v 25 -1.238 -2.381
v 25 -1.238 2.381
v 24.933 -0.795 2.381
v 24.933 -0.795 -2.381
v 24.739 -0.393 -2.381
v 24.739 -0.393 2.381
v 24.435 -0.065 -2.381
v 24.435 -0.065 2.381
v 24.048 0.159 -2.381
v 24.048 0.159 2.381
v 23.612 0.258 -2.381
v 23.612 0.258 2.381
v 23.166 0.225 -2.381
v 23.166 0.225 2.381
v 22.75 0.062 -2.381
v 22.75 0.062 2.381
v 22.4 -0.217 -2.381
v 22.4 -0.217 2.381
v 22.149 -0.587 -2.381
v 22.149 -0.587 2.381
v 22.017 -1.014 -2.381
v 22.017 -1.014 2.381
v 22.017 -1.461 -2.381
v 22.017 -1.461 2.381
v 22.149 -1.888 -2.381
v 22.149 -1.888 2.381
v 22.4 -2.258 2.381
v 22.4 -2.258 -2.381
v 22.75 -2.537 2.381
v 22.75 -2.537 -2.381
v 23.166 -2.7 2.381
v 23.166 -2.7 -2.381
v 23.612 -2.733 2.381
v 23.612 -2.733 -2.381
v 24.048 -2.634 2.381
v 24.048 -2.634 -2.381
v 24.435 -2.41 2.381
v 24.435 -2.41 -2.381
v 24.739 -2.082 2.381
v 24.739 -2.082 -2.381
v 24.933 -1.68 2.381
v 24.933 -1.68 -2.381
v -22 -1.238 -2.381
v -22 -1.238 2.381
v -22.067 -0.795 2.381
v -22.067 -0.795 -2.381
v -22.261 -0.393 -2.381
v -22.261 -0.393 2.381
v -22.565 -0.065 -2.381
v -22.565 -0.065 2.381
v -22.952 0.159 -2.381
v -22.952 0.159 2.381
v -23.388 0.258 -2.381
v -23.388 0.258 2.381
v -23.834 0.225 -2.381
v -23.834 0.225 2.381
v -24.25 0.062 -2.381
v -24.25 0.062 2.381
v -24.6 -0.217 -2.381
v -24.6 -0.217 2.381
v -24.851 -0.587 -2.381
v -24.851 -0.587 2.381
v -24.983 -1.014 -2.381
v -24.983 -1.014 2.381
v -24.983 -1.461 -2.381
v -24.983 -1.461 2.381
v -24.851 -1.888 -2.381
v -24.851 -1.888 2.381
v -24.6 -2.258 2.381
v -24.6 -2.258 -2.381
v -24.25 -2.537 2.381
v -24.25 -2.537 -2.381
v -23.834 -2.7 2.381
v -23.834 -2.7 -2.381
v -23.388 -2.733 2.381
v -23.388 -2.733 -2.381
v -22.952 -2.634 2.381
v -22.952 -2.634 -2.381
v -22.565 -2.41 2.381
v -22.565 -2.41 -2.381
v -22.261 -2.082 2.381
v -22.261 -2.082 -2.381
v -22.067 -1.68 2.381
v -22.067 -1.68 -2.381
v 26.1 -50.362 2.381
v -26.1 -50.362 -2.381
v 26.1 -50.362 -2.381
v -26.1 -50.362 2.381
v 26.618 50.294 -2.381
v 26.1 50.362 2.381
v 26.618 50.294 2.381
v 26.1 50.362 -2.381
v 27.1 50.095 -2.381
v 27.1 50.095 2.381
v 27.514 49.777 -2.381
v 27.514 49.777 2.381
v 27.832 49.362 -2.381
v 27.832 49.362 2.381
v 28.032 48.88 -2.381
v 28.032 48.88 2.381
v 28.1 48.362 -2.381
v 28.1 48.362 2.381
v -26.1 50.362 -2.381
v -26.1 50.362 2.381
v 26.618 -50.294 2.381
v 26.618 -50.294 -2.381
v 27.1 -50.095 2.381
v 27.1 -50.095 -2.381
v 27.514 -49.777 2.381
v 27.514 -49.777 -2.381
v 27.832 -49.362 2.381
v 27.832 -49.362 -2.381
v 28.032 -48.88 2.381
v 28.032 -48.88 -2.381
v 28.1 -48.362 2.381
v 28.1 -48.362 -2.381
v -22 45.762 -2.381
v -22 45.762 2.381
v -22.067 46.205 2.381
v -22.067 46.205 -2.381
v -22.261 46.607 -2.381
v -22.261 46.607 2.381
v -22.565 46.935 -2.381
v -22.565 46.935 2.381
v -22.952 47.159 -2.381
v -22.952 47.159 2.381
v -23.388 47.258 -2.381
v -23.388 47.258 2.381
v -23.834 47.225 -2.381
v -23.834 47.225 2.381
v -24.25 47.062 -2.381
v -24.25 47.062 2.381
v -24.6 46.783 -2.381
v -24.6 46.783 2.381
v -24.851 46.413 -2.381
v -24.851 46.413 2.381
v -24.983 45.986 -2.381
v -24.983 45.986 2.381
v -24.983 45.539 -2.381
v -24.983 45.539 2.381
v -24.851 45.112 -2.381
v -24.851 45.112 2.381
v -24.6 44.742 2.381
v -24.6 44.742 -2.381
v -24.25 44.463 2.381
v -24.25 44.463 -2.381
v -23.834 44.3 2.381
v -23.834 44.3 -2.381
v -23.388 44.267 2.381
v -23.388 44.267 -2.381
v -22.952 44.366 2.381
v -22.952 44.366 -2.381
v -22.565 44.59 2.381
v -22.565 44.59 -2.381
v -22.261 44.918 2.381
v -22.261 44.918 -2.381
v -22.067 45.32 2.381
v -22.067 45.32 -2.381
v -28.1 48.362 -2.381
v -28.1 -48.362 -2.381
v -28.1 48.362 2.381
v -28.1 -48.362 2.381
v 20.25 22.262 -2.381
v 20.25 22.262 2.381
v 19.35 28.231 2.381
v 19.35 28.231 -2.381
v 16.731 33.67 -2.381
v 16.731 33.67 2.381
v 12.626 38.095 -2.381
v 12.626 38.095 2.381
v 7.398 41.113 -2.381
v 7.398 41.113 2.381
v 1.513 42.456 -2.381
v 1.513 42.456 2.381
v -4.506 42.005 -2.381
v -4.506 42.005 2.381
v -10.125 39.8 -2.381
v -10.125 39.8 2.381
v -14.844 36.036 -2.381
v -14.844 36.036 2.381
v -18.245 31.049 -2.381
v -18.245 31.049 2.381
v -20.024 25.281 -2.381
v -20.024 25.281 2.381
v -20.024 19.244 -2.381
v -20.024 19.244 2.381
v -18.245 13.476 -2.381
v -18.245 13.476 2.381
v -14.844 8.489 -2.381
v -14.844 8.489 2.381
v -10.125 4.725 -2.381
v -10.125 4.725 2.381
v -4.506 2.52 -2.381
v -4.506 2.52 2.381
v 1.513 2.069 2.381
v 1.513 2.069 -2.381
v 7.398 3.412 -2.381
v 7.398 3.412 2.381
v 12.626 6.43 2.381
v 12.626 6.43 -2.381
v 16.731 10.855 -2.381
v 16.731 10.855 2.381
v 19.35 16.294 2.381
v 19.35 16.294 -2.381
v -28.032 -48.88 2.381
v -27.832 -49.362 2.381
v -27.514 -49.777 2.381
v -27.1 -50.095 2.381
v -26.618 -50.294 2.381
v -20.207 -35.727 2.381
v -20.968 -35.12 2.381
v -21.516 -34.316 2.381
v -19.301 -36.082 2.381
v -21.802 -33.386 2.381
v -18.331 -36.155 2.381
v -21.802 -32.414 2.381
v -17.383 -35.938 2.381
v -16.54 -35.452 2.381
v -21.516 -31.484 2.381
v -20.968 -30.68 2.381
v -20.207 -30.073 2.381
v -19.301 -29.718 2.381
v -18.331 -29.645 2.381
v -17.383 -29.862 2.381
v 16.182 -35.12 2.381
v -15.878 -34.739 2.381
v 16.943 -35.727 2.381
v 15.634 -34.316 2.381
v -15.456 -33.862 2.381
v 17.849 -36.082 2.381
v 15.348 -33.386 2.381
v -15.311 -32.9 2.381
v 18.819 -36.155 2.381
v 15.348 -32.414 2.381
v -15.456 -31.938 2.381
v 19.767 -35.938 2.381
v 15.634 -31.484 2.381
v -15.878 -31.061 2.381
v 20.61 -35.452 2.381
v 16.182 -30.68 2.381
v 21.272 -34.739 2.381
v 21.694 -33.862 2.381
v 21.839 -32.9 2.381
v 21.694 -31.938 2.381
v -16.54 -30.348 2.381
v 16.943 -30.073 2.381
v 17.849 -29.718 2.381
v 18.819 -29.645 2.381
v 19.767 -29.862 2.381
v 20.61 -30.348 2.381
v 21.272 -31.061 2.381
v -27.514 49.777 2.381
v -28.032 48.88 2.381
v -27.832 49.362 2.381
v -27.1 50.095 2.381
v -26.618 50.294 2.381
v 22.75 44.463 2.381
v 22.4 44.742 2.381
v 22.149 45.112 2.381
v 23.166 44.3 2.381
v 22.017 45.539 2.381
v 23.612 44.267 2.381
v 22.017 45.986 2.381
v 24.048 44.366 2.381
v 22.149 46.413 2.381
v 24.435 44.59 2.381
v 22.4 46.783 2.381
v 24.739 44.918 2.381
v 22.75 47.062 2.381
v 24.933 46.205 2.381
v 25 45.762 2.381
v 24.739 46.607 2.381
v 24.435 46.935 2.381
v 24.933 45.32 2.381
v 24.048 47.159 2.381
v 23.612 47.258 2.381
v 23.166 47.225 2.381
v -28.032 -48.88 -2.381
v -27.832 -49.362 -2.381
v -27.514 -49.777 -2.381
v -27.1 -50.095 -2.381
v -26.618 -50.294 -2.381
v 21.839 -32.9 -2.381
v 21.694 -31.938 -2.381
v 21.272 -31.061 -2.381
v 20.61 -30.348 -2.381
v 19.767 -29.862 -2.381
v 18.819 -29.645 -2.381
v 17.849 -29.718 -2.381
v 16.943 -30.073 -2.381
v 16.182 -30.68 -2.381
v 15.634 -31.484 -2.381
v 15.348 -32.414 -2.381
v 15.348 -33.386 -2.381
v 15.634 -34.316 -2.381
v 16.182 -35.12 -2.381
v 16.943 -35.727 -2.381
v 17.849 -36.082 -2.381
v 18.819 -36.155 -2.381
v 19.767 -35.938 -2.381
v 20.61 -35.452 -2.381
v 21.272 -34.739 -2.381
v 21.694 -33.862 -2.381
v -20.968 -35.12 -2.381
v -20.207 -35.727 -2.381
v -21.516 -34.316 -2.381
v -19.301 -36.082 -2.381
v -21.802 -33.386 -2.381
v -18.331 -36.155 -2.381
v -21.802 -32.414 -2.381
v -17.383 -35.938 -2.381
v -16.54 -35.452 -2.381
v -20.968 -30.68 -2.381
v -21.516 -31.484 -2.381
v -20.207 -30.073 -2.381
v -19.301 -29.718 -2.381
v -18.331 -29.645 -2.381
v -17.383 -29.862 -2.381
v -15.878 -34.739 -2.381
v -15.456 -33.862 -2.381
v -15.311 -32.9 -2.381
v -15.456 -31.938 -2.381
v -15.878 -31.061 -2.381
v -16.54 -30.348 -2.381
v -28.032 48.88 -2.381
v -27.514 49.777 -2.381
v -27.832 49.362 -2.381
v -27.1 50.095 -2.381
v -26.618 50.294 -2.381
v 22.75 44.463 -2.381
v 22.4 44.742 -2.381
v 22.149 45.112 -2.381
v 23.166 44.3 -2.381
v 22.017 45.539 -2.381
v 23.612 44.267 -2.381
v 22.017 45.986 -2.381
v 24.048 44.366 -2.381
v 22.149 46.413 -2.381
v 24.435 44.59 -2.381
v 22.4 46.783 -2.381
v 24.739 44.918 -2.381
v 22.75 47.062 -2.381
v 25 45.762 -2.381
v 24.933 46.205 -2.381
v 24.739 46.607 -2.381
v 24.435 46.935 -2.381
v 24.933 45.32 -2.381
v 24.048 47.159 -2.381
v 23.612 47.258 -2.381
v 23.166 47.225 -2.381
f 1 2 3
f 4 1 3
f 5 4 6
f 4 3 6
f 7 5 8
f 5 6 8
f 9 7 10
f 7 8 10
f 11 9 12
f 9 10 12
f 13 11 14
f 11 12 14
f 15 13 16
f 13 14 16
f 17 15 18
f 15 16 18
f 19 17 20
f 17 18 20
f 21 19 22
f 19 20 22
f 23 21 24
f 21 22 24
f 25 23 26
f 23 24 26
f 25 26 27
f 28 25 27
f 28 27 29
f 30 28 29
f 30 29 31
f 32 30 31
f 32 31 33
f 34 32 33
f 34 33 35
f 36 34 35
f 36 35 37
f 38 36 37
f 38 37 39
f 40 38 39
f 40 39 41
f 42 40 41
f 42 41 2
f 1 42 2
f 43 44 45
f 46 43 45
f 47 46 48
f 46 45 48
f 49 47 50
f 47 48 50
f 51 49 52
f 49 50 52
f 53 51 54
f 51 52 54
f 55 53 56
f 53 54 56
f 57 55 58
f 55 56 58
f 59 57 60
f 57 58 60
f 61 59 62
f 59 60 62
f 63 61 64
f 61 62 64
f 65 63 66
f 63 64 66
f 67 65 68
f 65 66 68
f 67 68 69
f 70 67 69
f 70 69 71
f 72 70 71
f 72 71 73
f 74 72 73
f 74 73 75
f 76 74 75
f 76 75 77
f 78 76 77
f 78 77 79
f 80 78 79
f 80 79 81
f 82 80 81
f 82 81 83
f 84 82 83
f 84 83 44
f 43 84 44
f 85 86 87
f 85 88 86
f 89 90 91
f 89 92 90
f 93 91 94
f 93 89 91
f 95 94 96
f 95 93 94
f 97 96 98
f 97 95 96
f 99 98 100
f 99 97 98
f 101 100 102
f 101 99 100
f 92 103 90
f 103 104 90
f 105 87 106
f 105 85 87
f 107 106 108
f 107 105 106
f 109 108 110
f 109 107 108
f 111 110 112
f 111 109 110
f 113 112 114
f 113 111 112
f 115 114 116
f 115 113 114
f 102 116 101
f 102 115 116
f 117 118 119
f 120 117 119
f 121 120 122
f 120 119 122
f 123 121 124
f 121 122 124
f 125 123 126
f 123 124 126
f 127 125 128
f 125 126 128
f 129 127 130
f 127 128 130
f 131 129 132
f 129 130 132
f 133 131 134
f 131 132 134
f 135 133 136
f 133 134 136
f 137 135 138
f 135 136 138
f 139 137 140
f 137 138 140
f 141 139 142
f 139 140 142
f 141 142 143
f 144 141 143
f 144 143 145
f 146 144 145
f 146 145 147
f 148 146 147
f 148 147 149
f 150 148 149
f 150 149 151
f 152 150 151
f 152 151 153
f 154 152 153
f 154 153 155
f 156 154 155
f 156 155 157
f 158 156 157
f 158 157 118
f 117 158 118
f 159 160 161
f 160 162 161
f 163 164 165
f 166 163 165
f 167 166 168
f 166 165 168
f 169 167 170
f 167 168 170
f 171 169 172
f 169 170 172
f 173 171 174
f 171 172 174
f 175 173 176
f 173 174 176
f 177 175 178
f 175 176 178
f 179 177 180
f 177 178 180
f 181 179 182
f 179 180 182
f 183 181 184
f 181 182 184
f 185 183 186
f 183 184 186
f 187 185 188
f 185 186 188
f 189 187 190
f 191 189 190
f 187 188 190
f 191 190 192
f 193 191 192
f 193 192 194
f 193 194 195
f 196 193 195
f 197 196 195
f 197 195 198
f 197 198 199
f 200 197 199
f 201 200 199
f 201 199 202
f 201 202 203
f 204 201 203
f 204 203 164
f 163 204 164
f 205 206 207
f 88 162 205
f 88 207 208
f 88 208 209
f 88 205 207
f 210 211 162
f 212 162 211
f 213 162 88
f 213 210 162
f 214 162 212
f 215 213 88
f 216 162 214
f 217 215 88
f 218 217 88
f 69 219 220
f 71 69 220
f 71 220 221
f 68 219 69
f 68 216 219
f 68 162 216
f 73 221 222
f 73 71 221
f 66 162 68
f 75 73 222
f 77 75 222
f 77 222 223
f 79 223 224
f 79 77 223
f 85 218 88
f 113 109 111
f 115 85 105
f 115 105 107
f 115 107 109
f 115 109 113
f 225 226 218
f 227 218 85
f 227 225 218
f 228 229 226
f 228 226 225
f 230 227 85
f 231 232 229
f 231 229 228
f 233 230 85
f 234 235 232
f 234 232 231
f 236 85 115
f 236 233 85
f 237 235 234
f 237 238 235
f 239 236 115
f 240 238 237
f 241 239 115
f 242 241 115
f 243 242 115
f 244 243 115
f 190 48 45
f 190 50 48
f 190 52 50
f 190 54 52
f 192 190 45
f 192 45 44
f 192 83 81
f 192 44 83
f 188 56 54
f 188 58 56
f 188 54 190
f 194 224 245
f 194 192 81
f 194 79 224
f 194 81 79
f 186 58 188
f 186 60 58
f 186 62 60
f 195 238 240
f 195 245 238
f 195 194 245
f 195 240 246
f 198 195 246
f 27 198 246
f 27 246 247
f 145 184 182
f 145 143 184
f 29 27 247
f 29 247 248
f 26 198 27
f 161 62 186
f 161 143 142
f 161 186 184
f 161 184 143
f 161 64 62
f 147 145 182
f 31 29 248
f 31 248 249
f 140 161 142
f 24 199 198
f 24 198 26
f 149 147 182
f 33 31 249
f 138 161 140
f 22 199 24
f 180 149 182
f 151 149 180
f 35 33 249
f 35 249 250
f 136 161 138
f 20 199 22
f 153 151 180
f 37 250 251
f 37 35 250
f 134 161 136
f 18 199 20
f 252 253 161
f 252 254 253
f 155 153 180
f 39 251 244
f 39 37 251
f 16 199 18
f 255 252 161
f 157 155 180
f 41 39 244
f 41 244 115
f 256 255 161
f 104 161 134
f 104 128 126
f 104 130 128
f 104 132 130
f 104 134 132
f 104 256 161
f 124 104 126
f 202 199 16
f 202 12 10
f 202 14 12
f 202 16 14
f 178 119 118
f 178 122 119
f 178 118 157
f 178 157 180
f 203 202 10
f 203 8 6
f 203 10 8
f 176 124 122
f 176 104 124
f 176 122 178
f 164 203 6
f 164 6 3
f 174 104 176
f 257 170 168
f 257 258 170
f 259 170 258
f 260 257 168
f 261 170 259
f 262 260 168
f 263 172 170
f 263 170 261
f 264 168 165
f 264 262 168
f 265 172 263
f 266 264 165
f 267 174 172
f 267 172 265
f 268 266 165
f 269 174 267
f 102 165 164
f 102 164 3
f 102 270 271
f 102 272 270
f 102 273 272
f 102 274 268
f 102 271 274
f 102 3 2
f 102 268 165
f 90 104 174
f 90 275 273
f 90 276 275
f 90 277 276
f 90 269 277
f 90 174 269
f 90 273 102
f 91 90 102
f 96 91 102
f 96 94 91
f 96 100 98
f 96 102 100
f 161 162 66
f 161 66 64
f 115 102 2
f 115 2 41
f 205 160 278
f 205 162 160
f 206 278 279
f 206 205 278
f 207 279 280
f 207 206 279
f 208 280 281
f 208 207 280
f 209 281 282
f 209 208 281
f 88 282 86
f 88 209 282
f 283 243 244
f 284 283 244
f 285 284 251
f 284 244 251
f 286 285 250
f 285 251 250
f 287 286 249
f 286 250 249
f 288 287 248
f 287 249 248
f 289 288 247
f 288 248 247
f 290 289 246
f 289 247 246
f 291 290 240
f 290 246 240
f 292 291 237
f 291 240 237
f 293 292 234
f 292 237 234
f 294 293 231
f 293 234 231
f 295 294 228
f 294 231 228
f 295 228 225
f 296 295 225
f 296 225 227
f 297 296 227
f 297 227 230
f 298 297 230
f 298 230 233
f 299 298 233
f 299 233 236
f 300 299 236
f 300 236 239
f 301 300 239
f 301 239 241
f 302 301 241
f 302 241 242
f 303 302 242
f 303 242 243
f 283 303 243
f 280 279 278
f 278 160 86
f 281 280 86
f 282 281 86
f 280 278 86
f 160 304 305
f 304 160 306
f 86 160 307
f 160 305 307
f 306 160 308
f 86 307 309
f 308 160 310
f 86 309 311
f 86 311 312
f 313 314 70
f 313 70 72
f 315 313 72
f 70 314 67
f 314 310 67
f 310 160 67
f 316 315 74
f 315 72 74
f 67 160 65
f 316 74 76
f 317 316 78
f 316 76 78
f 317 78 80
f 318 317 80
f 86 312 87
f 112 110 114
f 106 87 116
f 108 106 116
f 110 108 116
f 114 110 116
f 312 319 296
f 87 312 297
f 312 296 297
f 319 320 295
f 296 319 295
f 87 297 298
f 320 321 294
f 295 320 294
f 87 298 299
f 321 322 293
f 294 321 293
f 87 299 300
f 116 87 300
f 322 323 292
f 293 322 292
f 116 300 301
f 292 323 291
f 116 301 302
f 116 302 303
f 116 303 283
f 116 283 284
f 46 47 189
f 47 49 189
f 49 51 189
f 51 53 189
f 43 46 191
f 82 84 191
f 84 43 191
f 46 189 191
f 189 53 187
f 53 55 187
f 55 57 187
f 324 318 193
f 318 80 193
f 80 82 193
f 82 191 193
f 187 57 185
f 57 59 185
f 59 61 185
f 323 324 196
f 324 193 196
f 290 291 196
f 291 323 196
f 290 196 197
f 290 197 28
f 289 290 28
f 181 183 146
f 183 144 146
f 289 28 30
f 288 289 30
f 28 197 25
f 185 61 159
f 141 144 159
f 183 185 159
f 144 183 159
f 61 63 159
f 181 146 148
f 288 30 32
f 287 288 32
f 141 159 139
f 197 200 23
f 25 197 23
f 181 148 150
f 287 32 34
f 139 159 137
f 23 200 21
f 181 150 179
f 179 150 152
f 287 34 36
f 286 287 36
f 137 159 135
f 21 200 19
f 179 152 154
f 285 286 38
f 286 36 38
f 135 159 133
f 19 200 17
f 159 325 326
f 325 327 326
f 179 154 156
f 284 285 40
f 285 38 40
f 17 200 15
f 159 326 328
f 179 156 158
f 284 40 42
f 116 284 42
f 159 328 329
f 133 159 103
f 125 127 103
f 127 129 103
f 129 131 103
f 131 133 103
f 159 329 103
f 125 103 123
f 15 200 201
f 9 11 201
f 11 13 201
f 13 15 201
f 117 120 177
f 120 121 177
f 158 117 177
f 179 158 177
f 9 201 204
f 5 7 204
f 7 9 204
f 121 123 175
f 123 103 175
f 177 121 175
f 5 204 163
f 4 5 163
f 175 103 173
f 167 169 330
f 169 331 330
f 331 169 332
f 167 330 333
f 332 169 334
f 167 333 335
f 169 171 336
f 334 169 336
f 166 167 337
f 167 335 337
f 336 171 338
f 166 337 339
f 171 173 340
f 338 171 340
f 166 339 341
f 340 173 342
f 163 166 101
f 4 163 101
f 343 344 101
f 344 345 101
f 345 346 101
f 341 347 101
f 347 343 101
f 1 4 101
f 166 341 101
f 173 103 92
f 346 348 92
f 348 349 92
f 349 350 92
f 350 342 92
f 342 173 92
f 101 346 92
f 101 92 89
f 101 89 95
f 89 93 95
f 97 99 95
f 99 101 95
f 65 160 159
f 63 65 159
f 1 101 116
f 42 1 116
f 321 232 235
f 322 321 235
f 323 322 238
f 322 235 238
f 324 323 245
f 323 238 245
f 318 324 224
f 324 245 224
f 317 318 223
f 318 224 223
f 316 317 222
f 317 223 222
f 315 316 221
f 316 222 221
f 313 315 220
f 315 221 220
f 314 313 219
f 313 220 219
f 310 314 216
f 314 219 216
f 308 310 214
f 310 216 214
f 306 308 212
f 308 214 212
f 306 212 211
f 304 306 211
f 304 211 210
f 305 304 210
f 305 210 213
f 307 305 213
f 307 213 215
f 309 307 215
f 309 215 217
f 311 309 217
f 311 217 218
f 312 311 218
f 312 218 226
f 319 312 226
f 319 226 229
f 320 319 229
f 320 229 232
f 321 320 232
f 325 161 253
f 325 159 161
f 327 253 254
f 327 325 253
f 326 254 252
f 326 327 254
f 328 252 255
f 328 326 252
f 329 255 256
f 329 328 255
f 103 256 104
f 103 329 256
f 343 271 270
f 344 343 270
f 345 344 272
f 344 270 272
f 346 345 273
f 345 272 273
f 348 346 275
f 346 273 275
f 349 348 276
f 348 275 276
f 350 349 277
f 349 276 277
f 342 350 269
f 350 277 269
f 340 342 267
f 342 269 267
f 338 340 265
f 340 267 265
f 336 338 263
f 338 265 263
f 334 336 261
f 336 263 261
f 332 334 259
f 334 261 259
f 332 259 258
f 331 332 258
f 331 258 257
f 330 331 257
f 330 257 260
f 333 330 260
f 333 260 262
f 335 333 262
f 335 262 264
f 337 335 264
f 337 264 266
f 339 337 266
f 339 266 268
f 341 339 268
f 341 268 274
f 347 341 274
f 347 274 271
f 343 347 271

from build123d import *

# Parameters (mm, degrees)
SKETCH1_W           = 56.2
SKETCH1_H           = 100.725
BOSS_EXTRUDE1_DEPTH = 2.38125
SKETCH2_R           = 20.25
SKETCH2_R_2         = 1.5
SKETCH2_R_3         = 3.2639
CUT_EXTRUDE1_DEPTH  = 58.867718224
FILLET1_R           = 2


with BuildPart() as part:
    # Sketch1 → Boss-Extrude1 (new, symmetric)
    with BuildSketch(Plane.XY):
        Rectangle(SKETCH1_W, SKETCH1_H)
    extrude(amount=BOSS_EXTRUDE1_DEPTH, both=True)

    # Sketch2 → Cut-Extrude1 (cut, through all)
    with BuildSketch(Plane.XY.offset(2.38125)):
        with Locations((0, 22.2625)):
            Circle(SKETCH2_R)
        with Locations((-23.5, 45.7625)):
            Circle(SKETCH2_R_2)
        with Locations((23.5, 45.7625)):
            Circle(SKETCH2_R_2)
        with Locations((-23.5, -1.2375)):
            Circle(SKETCH2_R_2)
        with Locations((23.5, -1.2375)):
            Circle(SKETCH2_R_2)
        with Locations((-18.575, -32.9)):
            Circle(SKETCH2_R_3)
        with Locations((18.575, -32.9)):
            Circle(SKETCH2_R_3)
    extrude(amount=-CUT_EXTRUDE1_DEPTH, mode=Mode.SUBTRACT)

    # Fillet1
    fillet1_edges = [part.edges().sort_by_distance(p)[0] for p in [
        (28.1, -50.3625, 0),
        (-28.1, -50.3625, 0),
        (-28.1, 50.3625, 0),
        (28.1, 50.3625, 0),
    ]]
    fillet(fillet1_edges, radius=FILLET1_R)


solid = part.part
